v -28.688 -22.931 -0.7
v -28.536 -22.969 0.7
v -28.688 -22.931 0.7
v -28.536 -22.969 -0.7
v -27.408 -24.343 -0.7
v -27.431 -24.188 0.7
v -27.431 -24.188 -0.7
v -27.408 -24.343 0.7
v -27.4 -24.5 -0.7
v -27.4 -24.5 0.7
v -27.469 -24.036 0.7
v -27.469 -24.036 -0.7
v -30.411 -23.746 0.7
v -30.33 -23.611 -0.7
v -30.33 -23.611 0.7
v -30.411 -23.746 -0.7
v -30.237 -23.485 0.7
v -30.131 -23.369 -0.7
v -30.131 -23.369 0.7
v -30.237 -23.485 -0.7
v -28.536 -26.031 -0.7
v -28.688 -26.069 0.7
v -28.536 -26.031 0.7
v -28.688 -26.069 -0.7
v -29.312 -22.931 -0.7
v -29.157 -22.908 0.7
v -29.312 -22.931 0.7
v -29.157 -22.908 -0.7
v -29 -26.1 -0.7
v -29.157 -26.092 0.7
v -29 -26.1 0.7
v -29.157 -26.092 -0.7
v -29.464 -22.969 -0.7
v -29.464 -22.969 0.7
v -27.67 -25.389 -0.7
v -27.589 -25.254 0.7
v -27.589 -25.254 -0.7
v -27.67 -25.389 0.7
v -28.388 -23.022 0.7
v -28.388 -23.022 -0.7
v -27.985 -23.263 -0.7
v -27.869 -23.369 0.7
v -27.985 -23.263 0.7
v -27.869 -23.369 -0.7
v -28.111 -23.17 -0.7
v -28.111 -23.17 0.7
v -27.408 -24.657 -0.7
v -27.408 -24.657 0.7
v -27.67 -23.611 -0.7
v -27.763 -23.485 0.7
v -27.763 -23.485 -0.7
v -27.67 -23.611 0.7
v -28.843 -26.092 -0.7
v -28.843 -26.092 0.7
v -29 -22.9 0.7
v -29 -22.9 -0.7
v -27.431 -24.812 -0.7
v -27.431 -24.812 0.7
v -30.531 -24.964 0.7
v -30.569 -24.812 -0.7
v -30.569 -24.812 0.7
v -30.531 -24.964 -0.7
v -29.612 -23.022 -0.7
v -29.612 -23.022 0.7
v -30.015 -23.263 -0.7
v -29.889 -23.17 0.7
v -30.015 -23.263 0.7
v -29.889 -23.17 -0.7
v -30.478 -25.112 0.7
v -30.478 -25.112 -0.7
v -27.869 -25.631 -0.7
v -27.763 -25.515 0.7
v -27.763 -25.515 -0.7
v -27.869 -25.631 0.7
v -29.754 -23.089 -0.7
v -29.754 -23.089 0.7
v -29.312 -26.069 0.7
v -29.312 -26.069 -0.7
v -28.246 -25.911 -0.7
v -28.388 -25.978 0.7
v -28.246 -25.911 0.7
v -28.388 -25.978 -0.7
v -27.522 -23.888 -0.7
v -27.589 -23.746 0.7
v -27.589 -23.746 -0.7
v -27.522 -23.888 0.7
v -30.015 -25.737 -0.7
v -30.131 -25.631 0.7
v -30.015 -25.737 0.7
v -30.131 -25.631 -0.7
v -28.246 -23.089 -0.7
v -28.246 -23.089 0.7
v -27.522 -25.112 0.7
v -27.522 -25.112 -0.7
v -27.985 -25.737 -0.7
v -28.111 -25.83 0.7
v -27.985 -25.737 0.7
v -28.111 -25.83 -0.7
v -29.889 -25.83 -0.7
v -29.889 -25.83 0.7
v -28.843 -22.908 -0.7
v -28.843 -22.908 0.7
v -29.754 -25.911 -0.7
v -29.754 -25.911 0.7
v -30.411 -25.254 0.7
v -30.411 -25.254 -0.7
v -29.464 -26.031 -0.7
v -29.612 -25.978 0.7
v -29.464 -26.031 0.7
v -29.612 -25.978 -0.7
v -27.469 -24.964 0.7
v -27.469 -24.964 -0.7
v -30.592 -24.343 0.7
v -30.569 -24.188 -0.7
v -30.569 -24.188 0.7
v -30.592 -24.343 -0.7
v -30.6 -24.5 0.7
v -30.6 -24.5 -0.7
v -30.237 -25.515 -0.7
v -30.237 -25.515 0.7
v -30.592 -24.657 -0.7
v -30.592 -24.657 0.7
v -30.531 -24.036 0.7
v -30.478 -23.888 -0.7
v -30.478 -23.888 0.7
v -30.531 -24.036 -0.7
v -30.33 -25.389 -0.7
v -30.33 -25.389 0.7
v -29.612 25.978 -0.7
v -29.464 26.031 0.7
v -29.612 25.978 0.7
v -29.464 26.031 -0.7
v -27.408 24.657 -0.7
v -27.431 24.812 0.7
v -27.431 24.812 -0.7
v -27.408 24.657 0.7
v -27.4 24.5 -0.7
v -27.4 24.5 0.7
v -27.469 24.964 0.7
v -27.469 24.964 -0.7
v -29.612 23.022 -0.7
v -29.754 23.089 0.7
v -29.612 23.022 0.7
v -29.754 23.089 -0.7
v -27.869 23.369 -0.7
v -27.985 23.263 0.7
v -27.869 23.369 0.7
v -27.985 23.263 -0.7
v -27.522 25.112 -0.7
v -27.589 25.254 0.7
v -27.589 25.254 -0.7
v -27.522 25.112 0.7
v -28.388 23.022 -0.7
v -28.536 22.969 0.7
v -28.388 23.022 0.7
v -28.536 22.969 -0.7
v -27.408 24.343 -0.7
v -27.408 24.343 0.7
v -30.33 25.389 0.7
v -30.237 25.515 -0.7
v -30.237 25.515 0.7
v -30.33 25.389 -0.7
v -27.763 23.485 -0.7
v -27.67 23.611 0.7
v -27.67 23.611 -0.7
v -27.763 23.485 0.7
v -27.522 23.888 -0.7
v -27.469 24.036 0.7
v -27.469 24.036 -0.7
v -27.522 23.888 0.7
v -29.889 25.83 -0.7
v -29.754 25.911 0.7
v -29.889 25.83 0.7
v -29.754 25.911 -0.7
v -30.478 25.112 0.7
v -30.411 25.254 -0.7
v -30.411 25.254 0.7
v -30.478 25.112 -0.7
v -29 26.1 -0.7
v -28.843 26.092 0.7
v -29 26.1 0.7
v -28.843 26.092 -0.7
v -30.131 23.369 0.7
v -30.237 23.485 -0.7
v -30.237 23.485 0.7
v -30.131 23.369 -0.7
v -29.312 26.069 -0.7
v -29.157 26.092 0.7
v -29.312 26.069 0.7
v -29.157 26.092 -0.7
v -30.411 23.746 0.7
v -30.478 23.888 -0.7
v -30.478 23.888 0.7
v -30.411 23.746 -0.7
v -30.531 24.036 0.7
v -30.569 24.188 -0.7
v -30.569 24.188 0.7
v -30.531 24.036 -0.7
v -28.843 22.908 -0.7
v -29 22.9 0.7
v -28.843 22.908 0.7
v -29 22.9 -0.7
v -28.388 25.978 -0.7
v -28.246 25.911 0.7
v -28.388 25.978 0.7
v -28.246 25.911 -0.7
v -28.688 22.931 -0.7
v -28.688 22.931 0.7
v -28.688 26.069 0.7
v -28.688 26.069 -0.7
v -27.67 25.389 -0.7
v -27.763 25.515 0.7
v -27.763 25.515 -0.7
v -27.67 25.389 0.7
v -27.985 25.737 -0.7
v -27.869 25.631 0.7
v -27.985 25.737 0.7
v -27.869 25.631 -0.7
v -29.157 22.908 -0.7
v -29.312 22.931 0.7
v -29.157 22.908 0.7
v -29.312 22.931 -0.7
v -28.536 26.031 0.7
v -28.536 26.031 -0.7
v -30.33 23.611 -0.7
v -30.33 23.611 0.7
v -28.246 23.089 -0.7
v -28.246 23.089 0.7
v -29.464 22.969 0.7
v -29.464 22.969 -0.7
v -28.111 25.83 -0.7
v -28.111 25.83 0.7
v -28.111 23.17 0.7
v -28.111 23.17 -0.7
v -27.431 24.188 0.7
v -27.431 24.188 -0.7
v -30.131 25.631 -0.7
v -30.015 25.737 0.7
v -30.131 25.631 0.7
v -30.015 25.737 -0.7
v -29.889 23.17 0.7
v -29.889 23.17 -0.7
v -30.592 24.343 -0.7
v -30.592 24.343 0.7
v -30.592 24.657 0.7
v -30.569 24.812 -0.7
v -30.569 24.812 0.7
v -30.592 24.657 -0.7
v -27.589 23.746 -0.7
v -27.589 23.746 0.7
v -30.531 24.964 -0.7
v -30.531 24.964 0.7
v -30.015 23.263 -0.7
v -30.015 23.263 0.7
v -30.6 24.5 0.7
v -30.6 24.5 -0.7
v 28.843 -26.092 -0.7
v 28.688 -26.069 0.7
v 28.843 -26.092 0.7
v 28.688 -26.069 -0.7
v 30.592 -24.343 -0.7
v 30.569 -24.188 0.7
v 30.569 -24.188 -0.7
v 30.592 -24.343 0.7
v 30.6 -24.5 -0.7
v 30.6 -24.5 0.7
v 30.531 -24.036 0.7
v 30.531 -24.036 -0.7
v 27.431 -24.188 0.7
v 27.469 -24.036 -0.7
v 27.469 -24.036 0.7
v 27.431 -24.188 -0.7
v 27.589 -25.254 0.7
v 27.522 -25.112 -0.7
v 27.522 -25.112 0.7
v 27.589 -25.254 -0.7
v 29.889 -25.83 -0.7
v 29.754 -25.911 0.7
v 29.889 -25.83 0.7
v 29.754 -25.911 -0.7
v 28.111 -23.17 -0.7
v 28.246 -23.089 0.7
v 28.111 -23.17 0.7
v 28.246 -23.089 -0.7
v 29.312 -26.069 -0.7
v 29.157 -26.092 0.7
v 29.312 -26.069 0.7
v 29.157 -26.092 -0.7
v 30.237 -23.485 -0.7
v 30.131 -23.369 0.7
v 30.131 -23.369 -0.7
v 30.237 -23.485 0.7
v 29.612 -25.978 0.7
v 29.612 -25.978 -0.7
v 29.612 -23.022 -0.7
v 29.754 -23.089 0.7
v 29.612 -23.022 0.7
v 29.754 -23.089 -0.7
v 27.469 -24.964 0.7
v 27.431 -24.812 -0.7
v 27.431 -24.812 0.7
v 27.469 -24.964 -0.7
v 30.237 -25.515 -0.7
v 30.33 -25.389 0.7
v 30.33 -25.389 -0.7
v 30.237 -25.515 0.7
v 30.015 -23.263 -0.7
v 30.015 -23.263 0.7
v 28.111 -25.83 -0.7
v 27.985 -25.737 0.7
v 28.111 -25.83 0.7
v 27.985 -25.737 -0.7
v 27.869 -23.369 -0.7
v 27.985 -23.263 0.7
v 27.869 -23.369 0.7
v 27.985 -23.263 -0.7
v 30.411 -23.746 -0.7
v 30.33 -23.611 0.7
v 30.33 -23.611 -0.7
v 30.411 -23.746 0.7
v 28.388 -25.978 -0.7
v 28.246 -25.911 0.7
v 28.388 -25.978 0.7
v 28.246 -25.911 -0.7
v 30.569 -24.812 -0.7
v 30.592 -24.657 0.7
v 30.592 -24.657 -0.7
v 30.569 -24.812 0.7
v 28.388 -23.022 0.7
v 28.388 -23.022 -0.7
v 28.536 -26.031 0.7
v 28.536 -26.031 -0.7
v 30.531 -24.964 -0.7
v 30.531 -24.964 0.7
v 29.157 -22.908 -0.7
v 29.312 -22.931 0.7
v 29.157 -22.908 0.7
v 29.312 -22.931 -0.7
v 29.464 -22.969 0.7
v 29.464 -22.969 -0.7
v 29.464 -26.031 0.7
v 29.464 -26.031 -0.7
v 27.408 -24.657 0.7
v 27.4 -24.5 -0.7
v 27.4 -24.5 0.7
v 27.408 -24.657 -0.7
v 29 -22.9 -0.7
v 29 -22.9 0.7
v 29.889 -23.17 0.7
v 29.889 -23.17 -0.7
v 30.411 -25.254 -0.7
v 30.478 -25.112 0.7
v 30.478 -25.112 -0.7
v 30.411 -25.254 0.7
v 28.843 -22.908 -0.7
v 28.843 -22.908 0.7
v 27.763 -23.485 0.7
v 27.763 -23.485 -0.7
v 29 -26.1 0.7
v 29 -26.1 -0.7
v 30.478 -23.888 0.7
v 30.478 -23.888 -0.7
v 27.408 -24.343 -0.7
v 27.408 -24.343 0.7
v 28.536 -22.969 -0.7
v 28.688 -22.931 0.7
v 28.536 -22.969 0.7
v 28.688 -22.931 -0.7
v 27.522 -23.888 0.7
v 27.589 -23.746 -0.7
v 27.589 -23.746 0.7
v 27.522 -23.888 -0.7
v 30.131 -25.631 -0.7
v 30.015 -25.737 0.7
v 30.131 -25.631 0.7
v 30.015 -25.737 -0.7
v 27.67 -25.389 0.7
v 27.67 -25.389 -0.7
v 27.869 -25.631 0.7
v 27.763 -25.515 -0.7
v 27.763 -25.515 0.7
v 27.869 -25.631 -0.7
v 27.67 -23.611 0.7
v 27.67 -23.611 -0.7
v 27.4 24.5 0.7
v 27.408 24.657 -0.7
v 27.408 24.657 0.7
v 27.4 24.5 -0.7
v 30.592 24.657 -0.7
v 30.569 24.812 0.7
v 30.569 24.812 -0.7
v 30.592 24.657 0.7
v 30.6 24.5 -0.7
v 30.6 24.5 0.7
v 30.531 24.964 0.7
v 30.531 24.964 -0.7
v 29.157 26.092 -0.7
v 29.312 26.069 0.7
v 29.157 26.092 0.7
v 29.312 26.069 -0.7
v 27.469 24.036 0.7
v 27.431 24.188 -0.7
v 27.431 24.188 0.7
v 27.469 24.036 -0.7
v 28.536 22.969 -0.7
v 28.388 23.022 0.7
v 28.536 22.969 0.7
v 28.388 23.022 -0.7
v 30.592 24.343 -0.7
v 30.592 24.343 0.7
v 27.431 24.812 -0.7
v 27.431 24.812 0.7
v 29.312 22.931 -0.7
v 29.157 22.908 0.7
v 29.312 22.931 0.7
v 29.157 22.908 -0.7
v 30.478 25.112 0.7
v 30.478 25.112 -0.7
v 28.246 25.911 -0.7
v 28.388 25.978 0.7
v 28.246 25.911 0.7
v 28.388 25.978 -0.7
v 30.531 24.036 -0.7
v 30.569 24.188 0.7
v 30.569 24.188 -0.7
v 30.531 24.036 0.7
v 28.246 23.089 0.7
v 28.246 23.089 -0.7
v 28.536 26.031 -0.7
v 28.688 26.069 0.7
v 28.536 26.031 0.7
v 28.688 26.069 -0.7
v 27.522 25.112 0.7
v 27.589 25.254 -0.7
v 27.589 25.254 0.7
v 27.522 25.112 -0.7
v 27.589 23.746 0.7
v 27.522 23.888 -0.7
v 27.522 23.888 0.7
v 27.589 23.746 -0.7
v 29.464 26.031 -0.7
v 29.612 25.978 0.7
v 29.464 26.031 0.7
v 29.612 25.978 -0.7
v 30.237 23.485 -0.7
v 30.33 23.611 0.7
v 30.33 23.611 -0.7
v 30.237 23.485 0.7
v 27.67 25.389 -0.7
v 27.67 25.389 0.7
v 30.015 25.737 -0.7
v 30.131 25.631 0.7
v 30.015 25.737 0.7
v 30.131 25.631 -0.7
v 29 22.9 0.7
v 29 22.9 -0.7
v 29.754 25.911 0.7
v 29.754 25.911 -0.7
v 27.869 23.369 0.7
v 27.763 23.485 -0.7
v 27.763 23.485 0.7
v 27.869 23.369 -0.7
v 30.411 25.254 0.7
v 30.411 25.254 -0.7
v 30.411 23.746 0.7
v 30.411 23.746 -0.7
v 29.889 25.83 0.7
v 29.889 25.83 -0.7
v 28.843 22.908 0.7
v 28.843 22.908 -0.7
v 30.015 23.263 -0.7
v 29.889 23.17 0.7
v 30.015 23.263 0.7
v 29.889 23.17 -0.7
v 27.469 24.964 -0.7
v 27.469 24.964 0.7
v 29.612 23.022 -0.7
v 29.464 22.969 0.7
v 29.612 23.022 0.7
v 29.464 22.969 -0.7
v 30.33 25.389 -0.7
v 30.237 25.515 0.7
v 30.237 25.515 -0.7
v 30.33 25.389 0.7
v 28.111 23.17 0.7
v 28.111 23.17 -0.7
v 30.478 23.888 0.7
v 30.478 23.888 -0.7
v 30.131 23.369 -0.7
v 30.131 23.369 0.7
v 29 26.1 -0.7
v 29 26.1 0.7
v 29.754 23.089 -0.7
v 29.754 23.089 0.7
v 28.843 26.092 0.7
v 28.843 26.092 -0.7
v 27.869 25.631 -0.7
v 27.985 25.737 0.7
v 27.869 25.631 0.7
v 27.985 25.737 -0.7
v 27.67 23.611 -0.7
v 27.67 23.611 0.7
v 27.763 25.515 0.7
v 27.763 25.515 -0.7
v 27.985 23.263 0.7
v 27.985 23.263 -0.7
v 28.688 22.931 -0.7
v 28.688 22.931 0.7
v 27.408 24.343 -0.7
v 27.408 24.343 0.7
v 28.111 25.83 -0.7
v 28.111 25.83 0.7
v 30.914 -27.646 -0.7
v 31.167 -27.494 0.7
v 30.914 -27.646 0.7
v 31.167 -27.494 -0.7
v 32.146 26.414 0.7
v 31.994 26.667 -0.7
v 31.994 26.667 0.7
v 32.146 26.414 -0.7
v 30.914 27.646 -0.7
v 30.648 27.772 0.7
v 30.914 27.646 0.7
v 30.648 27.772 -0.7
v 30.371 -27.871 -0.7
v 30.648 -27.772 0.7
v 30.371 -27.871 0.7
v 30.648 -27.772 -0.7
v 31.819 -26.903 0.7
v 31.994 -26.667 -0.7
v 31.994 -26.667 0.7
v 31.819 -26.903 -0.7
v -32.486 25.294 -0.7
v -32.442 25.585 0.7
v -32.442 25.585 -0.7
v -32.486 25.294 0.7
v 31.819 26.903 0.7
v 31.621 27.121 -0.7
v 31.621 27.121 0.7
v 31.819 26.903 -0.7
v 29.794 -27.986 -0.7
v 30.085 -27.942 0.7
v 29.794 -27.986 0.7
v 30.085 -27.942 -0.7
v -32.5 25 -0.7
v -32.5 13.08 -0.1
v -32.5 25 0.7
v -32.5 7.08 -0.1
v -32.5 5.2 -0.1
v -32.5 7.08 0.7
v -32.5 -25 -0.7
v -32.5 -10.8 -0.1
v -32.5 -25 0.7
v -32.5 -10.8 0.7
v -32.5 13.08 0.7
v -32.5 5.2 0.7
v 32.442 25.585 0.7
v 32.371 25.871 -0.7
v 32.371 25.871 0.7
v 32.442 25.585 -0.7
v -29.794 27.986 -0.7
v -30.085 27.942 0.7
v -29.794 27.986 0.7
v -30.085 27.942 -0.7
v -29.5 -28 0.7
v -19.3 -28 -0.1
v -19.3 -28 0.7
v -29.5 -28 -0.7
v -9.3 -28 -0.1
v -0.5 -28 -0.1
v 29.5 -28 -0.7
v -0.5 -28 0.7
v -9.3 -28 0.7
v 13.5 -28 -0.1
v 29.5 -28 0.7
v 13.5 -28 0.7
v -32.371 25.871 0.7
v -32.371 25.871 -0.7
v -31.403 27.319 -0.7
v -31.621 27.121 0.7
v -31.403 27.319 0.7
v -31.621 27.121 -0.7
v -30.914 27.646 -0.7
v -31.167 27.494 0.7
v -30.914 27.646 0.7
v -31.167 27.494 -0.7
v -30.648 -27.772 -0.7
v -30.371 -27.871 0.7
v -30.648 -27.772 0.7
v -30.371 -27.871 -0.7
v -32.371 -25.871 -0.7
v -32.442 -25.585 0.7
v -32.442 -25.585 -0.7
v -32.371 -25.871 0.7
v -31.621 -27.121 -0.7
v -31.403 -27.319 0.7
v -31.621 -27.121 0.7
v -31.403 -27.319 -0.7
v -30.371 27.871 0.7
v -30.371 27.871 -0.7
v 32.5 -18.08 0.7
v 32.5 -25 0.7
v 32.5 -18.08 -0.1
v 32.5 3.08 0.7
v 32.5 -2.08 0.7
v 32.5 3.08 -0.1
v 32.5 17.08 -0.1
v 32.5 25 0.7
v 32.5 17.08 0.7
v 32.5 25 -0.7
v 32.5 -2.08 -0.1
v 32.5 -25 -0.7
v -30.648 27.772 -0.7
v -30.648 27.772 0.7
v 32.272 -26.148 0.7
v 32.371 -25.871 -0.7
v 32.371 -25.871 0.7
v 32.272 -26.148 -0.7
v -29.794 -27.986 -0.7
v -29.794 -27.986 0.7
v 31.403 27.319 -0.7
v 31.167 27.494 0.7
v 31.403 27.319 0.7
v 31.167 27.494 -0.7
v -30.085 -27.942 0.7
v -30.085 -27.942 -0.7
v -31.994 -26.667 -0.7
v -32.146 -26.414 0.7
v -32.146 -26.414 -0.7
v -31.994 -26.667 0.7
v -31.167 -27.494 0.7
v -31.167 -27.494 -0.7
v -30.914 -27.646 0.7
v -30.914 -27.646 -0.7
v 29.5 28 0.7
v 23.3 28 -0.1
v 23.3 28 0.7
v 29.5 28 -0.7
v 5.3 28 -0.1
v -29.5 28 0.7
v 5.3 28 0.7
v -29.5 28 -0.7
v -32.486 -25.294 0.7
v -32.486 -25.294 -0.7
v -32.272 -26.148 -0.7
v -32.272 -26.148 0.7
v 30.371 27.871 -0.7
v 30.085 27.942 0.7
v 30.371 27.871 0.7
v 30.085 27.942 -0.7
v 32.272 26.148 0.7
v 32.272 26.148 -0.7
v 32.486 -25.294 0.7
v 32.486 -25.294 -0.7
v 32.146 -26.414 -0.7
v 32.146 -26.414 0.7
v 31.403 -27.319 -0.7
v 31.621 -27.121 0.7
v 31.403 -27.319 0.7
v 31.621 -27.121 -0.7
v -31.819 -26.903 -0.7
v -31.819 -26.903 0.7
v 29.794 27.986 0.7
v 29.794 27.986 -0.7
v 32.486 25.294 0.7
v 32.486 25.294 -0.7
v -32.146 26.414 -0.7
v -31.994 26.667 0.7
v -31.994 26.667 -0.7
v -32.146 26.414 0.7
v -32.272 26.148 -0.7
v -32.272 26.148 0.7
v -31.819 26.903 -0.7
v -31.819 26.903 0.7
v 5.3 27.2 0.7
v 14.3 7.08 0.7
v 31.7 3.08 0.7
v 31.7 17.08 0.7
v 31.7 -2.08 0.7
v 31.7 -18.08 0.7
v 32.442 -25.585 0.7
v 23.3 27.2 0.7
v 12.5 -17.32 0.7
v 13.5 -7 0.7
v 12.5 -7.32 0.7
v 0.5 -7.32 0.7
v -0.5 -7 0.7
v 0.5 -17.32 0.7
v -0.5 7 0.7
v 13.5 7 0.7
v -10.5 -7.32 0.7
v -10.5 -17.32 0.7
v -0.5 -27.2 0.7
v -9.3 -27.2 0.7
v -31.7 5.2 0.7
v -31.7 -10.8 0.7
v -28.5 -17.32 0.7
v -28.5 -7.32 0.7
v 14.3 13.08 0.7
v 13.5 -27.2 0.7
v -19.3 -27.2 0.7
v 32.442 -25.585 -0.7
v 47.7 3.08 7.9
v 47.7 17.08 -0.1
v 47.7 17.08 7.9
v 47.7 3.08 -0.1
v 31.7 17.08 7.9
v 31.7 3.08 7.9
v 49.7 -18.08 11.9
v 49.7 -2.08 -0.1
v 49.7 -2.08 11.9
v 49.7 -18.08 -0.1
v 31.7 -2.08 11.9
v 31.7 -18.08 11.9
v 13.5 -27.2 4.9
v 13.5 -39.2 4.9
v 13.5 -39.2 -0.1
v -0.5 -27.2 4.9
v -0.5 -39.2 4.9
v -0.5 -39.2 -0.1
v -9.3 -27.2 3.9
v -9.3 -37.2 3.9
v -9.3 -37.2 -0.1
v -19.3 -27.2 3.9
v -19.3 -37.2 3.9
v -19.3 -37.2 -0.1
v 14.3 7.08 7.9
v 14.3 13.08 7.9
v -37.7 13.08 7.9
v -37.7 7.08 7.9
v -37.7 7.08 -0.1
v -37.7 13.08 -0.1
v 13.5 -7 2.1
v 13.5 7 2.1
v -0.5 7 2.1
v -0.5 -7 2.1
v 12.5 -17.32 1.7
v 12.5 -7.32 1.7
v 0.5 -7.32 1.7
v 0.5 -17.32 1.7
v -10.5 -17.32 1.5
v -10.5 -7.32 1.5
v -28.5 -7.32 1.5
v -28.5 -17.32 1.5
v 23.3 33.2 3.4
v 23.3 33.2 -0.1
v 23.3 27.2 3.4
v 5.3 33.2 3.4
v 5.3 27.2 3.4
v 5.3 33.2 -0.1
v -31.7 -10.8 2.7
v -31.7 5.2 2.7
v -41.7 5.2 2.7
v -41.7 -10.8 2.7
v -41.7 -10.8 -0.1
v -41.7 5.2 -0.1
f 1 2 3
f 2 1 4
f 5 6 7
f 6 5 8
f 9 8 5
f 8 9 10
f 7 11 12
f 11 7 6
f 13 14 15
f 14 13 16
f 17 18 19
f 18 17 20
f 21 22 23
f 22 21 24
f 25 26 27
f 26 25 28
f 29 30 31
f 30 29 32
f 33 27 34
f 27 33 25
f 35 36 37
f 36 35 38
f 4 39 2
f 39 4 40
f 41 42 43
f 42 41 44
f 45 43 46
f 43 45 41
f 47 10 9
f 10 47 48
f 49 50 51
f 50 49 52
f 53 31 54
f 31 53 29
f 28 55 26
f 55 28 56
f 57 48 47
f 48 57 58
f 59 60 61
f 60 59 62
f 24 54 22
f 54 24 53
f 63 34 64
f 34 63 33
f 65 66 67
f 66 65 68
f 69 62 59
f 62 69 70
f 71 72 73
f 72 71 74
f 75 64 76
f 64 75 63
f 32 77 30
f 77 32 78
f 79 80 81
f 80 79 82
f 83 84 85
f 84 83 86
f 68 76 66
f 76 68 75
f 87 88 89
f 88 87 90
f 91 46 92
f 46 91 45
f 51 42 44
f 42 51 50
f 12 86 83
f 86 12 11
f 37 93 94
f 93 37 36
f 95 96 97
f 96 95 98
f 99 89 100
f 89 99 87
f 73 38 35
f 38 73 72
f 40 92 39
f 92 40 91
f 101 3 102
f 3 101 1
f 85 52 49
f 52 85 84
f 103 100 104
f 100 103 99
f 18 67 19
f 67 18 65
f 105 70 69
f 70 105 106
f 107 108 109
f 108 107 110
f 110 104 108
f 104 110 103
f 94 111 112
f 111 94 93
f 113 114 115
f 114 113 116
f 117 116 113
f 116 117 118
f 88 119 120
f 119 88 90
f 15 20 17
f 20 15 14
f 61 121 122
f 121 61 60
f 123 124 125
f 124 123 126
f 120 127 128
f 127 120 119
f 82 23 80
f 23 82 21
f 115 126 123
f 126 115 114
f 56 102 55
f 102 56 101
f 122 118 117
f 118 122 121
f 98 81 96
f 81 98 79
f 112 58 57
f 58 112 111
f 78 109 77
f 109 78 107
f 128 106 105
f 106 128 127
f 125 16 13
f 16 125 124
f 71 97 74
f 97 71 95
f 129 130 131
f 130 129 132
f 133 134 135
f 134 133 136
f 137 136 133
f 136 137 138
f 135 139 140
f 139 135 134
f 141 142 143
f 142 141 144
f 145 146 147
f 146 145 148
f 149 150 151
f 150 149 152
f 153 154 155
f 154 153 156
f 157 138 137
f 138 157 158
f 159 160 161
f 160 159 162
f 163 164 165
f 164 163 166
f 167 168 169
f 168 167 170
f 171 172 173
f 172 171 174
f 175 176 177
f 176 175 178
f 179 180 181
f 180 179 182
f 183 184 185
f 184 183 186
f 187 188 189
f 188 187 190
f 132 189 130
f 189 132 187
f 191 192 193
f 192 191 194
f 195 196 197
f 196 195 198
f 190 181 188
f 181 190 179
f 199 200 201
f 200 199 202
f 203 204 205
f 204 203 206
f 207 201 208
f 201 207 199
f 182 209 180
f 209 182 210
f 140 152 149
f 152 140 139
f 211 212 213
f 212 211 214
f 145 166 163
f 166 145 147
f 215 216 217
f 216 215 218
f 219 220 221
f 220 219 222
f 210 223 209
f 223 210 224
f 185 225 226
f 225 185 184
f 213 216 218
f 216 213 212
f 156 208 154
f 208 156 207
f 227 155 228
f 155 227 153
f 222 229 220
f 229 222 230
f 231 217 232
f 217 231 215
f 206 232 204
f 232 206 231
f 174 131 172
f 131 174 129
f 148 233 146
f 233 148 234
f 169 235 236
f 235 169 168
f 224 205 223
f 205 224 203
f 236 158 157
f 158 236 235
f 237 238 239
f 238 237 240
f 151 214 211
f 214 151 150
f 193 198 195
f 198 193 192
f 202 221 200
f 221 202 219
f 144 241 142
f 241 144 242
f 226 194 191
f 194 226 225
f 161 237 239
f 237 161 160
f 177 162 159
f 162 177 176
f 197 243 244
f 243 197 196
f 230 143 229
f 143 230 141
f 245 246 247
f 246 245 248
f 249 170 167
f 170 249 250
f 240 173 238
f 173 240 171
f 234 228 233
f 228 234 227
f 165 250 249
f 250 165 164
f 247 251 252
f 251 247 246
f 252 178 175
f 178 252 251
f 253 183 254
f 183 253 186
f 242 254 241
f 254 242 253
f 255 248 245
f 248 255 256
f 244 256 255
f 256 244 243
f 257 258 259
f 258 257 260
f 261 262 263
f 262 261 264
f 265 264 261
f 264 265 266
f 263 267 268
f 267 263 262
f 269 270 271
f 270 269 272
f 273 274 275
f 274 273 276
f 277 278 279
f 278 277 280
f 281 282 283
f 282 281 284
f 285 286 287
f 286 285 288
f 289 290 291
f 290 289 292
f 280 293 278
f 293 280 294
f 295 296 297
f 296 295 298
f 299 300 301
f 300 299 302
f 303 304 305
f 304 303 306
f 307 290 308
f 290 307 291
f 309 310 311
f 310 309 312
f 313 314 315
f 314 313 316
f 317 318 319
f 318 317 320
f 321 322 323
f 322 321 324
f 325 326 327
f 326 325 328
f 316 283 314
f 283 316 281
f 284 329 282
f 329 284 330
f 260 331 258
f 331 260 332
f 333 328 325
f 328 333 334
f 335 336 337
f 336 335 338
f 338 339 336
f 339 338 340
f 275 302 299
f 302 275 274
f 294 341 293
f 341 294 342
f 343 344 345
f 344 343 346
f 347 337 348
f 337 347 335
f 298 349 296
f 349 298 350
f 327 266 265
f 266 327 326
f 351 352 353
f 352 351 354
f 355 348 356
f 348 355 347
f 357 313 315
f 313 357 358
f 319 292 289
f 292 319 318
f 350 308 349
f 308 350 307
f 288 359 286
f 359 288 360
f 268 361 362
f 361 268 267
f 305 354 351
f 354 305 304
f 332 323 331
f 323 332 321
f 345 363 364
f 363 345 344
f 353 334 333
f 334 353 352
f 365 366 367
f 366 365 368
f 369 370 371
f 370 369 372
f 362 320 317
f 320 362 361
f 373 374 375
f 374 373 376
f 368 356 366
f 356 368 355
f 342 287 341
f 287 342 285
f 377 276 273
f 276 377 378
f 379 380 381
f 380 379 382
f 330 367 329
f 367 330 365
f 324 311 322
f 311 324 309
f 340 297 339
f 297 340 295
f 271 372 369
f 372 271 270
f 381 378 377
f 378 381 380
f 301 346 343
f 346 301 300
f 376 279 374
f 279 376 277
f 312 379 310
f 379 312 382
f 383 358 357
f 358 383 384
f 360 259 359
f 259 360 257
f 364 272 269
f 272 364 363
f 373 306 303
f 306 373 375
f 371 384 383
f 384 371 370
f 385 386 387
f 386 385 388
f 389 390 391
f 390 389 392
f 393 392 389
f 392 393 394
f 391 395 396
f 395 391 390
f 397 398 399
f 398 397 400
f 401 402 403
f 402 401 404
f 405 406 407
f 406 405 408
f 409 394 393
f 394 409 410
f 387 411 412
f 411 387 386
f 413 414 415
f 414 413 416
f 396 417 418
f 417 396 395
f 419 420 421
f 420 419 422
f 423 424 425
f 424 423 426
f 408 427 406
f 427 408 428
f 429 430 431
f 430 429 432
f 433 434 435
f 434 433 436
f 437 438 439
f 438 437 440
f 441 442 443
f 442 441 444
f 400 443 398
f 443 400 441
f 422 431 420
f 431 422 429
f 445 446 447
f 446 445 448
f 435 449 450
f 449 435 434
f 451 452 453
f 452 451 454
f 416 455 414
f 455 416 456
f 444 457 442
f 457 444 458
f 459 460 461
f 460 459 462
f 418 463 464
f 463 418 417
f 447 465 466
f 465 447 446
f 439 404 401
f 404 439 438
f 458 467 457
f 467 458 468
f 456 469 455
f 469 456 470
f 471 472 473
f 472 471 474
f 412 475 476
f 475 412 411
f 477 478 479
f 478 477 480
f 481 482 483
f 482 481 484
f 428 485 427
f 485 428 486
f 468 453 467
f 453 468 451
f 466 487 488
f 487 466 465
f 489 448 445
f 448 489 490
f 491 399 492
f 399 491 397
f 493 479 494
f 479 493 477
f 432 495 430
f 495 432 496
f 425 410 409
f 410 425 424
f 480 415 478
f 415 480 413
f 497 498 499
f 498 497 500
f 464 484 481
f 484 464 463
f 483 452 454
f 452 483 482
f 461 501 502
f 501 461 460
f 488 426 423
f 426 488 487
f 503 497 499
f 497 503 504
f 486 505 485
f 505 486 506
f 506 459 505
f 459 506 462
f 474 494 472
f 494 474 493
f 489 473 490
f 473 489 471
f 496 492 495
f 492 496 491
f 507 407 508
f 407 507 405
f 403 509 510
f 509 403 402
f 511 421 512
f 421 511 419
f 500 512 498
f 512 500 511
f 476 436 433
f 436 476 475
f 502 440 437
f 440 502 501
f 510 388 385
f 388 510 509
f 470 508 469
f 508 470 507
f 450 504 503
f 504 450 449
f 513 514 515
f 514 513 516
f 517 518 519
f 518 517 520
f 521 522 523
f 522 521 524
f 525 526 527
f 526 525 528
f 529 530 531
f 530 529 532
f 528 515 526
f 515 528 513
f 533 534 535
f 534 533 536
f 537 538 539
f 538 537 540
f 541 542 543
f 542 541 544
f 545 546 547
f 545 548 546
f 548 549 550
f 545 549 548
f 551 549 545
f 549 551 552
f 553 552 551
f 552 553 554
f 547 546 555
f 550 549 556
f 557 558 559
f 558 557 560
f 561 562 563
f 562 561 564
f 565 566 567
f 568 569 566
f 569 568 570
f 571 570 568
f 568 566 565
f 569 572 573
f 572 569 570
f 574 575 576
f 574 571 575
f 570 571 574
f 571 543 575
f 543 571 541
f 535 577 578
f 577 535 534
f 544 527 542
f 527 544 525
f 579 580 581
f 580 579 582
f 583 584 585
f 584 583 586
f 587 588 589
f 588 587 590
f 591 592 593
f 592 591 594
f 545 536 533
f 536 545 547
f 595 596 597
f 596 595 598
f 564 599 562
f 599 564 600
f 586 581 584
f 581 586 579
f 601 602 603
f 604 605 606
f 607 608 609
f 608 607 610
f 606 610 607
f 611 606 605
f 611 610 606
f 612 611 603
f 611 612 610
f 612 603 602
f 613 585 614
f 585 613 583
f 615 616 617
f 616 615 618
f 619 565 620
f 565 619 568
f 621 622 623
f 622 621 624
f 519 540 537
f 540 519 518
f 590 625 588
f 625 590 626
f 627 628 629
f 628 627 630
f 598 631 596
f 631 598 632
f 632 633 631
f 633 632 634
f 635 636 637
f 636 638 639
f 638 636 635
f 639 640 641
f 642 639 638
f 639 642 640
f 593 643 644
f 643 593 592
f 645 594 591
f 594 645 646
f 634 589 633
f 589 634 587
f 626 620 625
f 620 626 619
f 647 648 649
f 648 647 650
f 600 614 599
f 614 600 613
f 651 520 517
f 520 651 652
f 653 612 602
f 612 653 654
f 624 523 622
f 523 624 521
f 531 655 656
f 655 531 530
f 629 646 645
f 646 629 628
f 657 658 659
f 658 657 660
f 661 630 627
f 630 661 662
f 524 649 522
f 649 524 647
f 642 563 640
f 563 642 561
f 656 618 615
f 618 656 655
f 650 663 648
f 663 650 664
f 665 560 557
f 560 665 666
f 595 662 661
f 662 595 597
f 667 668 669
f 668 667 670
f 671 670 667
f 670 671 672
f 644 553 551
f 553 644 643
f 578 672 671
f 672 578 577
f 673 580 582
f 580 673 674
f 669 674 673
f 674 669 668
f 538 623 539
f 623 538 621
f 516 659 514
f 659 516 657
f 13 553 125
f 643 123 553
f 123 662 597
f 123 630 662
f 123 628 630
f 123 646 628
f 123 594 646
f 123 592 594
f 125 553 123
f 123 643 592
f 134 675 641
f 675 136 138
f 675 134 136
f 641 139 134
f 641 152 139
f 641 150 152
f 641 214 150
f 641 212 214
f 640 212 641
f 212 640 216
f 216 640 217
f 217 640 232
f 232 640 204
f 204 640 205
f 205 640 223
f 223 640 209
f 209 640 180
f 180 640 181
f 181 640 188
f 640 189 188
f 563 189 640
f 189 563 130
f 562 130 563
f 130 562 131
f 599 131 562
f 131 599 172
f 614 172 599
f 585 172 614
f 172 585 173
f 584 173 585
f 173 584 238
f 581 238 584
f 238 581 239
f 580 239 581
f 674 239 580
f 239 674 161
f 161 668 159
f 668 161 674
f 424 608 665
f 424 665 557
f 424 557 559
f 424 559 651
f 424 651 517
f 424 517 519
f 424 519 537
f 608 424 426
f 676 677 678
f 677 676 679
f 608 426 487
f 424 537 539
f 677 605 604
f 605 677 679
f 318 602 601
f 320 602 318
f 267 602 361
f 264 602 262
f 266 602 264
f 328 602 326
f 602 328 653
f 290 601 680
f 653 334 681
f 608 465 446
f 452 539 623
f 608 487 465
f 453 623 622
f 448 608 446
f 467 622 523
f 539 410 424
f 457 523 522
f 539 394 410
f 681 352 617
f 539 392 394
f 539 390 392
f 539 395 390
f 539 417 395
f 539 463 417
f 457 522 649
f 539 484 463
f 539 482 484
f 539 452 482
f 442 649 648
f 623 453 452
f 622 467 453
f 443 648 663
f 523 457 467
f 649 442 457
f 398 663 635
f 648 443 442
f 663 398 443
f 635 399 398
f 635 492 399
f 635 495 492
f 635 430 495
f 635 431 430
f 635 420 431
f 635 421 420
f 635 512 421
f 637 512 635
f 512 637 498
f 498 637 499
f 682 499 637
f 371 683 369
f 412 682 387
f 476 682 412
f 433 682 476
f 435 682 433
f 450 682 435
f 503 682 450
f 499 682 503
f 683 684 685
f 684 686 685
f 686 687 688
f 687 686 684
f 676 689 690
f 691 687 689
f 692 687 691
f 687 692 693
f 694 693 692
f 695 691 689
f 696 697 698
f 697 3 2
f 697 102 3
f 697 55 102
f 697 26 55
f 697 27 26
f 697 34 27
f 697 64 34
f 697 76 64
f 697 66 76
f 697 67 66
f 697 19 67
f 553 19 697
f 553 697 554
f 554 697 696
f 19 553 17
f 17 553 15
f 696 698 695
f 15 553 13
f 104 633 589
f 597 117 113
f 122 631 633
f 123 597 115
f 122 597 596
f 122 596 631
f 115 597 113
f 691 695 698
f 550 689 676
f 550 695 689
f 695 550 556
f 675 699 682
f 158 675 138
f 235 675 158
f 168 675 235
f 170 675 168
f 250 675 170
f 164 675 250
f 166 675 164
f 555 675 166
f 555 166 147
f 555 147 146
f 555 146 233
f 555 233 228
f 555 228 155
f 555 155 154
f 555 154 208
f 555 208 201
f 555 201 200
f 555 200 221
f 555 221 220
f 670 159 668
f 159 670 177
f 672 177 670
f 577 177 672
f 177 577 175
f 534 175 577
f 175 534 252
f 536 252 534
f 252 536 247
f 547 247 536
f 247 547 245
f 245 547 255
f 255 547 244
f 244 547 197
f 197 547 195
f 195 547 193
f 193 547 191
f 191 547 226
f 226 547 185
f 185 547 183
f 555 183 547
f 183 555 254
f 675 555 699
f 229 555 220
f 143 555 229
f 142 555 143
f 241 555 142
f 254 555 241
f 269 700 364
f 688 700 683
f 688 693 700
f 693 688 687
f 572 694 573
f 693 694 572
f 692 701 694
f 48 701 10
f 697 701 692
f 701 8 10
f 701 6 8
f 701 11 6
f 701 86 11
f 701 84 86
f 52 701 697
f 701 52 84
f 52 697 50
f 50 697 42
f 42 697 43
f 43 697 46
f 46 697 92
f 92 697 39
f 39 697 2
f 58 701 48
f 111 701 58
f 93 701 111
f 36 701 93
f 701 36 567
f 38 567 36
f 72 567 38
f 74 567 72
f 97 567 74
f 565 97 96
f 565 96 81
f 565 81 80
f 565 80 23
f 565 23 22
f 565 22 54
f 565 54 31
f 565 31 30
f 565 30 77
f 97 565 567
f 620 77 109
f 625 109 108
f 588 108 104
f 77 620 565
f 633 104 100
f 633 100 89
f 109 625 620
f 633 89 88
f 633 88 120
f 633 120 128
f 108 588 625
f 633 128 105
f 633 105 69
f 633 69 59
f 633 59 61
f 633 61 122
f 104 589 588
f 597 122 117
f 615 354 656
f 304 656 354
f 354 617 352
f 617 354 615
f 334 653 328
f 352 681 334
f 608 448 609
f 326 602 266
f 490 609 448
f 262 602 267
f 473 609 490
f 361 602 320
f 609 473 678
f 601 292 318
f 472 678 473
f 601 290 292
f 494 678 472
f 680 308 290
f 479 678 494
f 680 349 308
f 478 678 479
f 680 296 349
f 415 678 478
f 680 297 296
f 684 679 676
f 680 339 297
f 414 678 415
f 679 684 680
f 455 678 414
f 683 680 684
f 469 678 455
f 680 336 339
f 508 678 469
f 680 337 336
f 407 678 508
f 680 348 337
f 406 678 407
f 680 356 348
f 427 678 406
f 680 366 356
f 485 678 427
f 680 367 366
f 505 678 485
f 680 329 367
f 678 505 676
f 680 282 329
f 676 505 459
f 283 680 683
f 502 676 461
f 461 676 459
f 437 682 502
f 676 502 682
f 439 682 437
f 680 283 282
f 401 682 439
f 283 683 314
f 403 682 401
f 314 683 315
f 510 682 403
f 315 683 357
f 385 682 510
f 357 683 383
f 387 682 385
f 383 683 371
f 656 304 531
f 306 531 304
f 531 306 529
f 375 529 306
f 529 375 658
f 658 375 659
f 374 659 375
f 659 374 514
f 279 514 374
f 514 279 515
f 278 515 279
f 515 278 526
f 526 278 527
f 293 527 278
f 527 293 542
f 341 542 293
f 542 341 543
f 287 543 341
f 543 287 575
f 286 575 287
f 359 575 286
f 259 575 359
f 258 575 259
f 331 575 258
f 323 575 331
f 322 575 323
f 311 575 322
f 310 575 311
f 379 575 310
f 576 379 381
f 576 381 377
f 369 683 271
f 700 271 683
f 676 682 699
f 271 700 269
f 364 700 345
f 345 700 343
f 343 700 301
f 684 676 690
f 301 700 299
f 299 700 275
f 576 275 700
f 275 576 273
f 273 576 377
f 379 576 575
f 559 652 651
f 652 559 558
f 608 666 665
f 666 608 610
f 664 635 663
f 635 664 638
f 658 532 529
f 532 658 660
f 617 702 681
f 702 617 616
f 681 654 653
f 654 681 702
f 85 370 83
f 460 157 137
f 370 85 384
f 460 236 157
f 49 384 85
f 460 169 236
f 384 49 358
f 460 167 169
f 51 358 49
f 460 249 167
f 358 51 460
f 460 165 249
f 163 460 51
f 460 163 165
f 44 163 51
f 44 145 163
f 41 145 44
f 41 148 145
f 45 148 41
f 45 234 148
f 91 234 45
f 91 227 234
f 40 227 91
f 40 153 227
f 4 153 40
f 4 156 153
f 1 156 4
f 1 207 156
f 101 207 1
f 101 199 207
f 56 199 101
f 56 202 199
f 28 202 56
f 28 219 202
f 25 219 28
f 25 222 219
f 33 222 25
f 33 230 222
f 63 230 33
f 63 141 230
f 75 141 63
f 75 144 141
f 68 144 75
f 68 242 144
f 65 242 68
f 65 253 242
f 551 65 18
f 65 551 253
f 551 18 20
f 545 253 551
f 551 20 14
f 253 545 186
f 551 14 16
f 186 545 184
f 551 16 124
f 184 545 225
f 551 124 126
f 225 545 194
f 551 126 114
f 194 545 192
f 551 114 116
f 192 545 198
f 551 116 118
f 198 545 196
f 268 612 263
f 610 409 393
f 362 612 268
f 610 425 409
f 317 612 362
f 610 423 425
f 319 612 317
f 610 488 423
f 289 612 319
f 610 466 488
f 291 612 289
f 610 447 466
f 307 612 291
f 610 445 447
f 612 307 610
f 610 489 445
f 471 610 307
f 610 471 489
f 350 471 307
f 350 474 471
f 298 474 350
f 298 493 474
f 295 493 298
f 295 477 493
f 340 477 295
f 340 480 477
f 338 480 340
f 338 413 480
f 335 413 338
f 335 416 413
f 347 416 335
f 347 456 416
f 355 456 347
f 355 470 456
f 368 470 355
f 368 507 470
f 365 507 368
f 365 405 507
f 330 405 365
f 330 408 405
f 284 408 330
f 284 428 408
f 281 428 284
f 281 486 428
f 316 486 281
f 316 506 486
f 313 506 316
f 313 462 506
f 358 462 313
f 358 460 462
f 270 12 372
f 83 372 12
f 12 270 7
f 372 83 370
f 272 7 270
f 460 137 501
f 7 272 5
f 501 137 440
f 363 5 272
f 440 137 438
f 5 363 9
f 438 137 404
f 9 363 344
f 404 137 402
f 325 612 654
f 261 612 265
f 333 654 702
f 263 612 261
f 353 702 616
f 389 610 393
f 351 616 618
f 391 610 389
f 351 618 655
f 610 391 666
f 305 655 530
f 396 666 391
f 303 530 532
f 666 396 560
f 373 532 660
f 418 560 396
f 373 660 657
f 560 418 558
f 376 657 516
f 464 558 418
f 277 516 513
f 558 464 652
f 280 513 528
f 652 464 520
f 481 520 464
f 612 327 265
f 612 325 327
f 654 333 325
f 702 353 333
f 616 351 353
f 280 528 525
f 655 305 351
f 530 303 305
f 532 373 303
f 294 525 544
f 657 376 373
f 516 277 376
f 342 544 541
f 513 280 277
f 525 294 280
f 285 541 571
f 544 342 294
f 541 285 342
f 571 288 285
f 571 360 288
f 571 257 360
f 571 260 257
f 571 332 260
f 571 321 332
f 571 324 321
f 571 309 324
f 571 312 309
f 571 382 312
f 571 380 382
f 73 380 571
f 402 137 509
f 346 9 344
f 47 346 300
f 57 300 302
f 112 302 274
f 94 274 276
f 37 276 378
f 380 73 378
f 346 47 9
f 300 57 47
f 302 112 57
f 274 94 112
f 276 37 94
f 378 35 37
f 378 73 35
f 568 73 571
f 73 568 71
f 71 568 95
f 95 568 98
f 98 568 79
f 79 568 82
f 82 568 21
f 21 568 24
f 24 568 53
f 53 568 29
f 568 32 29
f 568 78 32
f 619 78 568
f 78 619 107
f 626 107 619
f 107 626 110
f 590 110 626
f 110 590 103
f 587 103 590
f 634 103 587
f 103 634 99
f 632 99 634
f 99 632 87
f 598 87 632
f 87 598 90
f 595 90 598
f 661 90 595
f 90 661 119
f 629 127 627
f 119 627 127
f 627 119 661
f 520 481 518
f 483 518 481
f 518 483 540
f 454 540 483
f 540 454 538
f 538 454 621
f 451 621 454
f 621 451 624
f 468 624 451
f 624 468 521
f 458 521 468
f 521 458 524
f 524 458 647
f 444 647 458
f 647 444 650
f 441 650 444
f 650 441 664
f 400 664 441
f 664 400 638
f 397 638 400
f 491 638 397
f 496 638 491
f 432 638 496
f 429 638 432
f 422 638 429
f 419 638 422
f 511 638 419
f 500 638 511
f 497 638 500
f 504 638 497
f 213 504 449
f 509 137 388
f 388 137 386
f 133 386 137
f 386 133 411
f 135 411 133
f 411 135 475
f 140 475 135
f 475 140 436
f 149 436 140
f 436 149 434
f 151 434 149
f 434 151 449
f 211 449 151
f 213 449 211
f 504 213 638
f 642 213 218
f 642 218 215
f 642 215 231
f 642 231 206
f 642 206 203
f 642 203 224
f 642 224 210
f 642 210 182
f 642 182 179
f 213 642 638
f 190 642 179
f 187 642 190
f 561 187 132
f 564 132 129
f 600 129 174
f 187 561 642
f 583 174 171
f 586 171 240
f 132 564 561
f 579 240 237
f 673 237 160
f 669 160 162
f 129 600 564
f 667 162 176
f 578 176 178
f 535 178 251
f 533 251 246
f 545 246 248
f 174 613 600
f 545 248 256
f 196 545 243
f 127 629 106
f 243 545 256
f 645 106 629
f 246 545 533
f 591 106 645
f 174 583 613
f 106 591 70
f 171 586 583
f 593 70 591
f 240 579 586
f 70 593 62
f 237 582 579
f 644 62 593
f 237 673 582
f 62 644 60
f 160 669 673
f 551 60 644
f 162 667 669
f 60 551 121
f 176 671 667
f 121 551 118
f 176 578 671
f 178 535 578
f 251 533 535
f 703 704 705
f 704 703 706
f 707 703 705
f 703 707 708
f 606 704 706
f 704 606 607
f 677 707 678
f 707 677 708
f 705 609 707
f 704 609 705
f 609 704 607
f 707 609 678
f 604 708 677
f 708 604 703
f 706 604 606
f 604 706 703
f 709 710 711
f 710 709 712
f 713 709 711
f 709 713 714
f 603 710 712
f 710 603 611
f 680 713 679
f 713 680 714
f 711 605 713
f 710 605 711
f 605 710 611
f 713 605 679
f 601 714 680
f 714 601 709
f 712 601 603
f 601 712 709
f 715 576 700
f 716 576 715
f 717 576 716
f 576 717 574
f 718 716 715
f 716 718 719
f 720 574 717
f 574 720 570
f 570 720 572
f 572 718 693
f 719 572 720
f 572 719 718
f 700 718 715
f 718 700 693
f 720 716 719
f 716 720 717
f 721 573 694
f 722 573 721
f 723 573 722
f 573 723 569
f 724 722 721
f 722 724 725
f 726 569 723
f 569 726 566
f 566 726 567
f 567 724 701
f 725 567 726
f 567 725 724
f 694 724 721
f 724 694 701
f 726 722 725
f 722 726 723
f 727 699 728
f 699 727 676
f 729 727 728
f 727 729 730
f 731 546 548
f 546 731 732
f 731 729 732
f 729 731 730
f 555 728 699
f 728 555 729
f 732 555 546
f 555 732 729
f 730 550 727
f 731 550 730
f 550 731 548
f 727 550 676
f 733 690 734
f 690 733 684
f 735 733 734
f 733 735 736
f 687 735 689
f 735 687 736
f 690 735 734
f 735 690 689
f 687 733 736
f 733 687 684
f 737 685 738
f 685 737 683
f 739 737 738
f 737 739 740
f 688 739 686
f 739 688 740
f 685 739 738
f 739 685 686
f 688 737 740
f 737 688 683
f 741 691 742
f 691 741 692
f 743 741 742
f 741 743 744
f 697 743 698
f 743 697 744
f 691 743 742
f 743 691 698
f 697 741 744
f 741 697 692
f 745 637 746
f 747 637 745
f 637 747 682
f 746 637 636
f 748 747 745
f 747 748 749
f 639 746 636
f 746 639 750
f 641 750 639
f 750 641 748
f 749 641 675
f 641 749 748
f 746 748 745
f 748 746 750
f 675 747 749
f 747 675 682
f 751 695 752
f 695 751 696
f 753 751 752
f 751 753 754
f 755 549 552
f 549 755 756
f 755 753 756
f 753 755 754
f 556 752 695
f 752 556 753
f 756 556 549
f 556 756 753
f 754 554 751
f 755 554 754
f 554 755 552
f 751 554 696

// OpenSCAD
// Single-board computer (SBC) proxy model
// Target PCB: 65.0mm x 56.0mm x 1.4mm
// One connected solid (PCB + connectors/components fused with slight overlaps)

$fn = 64;

// Parameters
pcb_length = 65.0;
pcb_width  = 56.0;
pcb_thickness = 1.4;

eps_overlap = 0.8;          // intentional overlap to guarantee connectivity
corner_r = 3.0;             // rounded PCB corners

// Helper: rounded rectangle prism (centered)
module rounded_box_xy(size=[10,10,2], r=1, center=true) {
    x = size[0]; y = size[1]; z = size[2];
    translate(center ? [0,0,0] : [x/2, y/2, z/2])
        linear_extrude(height=z, center=true)
            offset(r=r)
                square([x-2*r, y-2*r], center=true);
}

// PCB with mounting holes (holes are cut, but model remains one connected solid)
module pcb() {
    hole_r = 1.6; // ~3.2mm dia
    hole_edge_x = 3.5;
    hole_edge_y = 3.5;

    difference() {
        color([0.0, 0.4, 0.2])
            rounded_box_xy([pcb_length, pcb_width, pcb_thickness], r=corner_r, center=true);

        // 4 mounting holes near corners
        for (sx = [-1, 1], sy = [-1, 1]) {
            translate([
                sx*(pcb_length/2 - hole_edge_x),
                sy*(pcb_width/2  - hole_edge_y),
                0
            ])
            cylinder(h=pcb_thickness + 2, r=hole_r, center=true);
        }
    }
}

// Generic component block placed on top surface, fused by overlap
module top_block(pos=[0,0], size=[10,10,5], z_clear=0) {
    translate([
        pos[0],
        pos[1],
        pcb_thickness/2 + size[2]/2 - eps_overlap + z_clear
    ])
    cube(size, center=true);
}

// Side connector that protrudes from an edge, fused by overlap into PCB
// edge: "right","left","top","bottom" relative to +X,-X,+Y,-Y
module side_connector(edge="right", along=0, size=[16,14,8]) {
    // size = [protrude_len (out of board), width_along_edge, height]
    protrude = size[0];
    along_w  = size[1];
    h        = size[2];

    if (edge == "right") {
        translate([
            pcb_length/2 + protrude/2 - eps_overlap,
            along,
            pcb_thickness/2 + h/2 - eps_overlap
        ])
        cube([protrude, along_w, h], center=true);
    } else if (edge == "left") {
        translate([
            -pcb_length/2 - protrude/2 + eps_overlap,
            along,
            pcb_thickness/2 + h/2 - eps_overlap
        ])
        cube([protrude, along_w, h], center=true);
    } else if (edge == "top") {
        translate([
            along,
            pcb_width/2 + protrude/2 - eps_overlap,
            pcb_thickness/2 + h/2 - eps_overlap
        ])
        cube([along_w, protrude, h], center=true);
    } else if (edge == "bottom") {
        translate([
            along,
            -pcb_width/2 - protrude/2 + eps_overlap,
            pcb_thickness/2 + h/2 - eps_overlap
        ])
        cube([along_w, protrude, h], center=true);
    }
}

// Main SBC model (single connected solid)
module sbc_complete_model() {
    union() {
        pcb();

        // Major connectors (simple proxies), all fused to PCB with calculated placement
        // USB-A like block on right edge
        color([0.75,0.75,0.75])
            side_connector("right", along= pcb_width*0.18, size=[16, 14, 8]);

        // Ethernet-like block on right edge (larger)
        color([0.70,0.70,0.70])
            side_connector("right", along= -pcb_width*0.18, size=[18, 16, 12]);

        // HDMI-like block on bottom edge
        color([0.65,0.65,0.65])
            side_connector("bottom", along= pcb_length*0.10, size=[12, 14, 5]);

        // USB-C / power-like block on bottom edge
        color([0.65,0.65,0.65])
            side_connector("bottom", along= -pcb_length*0.22, size=[10, 10, 4]);

        // 40-pin header proxy on top surface near left side
        color([0.10,0.10,0.10])
            top_block(
                pos=[-pcb_length*0.18, pcb_width*0.18],
                size=[52, 6, 8]
            );

        // Main SoC package
        color([0.15,0.15,0.15])
            top_block(
                pos=[pcb_length*0.10, 0],
                size=[14, 14, 2.2]
            );

        // RAM / secondary IC
        color([0.18,0.18,0.18])
            top_block(
                pos=[pcb_length*0.10, -pcb_width*0.22],
                size=[12, 10, 1.8]
            );

        // Small components cluster (kept connected by being on PCB top)
        color([0.25,0.25,0.25])
            top_block(
                pos=[-pcb_length*0.30, -pcb_width*0.22],
                size=[18, 10, 1.6]
            );

        // Camera/Display connector proxy on top edge
        color([0.85,0.85,0.85])
            side_connector("top", along= pcb_length*0.22, size=[6, 18, 3.5]);

        // MicroSD-like protrusion on left edge (thin)
        color([0.60,0.60,0.60])
            side_connector("left", along= -pcb_width*0.05, size=[10, 16, 2.8]);
    }
}

sbc_complete_model();
